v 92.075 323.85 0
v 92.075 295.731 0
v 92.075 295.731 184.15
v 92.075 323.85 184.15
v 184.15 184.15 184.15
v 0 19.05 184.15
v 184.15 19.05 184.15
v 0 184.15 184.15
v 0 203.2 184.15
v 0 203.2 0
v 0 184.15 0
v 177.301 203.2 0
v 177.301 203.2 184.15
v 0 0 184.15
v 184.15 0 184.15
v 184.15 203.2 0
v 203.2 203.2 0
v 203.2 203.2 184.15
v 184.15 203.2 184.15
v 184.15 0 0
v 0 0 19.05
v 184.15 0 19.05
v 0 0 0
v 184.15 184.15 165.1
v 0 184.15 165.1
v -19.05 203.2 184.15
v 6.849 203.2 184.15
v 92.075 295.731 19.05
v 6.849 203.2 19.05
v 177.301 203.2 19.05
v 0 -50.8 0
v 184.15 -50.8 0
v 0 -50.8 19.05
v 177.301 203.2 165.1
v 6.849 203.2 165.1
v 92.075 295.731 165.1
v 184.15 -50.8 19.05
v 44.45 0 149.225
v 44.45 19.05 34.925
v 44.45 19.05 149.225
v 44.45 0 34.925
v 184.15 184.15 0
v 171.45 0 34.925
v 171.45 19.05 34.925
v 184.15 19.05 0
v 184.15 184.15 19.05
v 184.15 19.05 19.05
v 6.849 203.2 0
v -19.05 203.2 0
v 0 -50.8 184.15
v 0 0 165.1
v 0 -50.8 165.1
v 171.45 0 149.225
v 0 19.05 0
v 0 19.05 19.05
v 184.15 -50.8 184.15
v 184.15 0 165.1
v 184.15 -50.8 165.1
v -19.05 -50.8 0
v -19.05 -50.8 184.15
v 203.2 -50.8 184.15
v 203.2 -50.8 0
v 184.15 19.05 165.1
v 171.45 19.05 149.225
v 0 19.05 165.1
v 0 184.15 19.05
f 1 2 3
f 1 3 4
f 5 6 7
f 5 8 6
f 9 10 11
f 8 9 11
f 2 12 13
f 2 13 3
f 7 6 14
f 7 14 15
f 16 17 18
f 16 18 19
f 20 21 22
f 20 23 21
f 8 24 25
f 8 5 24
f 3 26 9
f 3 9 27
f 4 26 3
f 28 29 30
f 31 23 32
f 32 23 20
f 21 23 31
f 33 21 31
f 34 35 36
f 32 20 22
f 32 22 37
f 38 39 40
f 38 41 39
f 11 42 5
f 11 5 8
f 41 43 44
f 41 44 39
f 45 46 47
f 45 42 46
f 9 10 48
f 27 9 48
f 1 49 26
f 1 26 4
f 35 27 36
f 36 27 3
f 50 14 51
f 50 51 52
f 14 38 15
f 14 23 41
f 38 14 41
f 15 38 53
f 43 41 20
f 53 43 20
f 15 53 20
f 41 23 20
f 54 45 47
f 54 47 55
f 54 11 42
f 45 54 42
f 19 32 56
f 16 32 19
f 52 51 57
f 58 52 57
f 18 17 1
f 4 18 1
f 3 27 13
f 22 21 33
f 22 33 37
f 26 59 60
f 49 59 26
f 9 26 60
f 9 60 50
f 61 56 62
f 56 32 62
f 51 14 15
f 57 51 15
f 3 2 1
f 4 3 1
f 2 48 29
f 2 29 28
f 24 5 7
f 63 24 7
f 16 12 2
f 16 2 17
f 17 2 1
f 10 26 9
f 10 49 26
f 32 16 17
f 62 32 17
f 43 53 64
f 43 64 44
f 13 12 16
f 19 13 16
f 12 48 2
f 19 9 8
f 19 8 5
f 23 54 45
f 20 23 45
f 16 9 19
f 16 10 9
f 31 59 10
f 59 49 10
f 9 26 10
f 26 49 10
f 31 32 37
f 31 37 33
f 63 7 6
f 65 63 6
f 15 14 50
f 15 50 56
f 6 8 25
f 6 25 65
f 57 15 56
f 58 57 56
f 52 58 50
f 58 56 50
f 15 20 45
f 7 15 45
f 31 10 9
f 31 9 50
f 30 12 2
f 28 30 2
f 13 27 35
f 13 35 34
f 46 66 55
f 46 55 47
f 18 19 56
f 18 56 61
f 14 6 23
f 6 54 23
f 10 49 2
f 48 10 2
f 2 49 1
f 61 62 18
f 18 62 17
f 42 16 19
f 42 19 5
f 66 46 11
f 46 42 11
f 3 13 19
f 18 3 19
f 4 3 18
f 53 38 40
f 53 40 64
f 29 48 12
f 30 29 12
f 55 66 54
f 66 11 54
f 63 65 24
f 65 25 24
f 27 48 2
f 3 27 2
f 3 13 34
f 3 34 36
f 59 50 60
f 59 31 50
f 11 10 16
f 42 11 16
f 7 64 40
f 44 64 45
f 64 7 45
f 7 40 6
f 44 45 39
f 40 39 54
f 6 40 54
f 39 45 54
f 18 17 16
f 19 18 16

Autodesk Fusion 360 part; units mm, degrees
sketch "Sketch5" plane through (0, 0, 0) normal (0, 0, 1) x (1, 0, 0)
  line L0 (0, 0) -> (184.15, 0)
  line L1 (184.15, 0) -> (184.15, 19.05)
  line L2 (184.15, 19.05) -> (0, 19.05)
  line L3 (0, 19.05) -> (0, 0)
  line L4 (-46.6311, 0) -> (230.0028, 0) construction
  line L5 (0, -50.8) -> (-19.05, -50.8)
  line L6 (-19.05, -50.8) -> (-19.05, 203.2)
  line L7 (-19.05, 203.2) -> (0, 203.2)
  line L8 (0, 203.2) -> (0, -50.8)
  line L9 (184.15, -50.8) -> (203.2, -50.8)
  line L10 (203.2, -50.8) -> (203.2, 203.2)
  line L11 (203.2, 203.2) -> (184.15, 203.2)
  line L12 (184.15, 203.2) -> (184.15, -50.8)
  line L13 (0, 203.2) -> (184.15, 203.2)
  line L14 (184.15, 203.2) -> (184.15, 184.15)
  line L15 (184.15, 184.15) -> (0, 184.15)
  line L16 (0, 184.15) -> (0, 203.2)
  line L17 (0, 0) -> (184.15, 0)
  line L18 (184.15, 0) -> (184.15, -50.8)
  line L19 (184.15, -50.8) -> (0, -50.8)
  line L20 (0, -50.8) -> (0, 0)
  line L21 (92.075, -50.8) -> (92.075, 323.85) construction
  line L22 (-19.05, 203.2) -> (92.075, 323.85)
  line L23 (203.2, 203.2) -> (92.075, 323.85)
  line L24 (189.1879, 190.2941) -> (92.075, 295.7309)
  line L25 (-5.0379, 190.2941) -> (92.075, 295.7309)
  line L26 (92.075, 295.7309) -> (92.075, 323.85)
  dimension "d72" = 184.15
  dimension "d73" = 19.05
  dimension "d74" = 19.05
  dimension "d75" = 254
  dimension "d76" = 19.05
  dimension "d77" = 50.8
  dimension "d78" = 19.05
  dimension "d79" = 254
  dimension "d80" = 50.8
  dimension "d81" = 184.15
  dimension "d82" = 19.05
  dimension "d83" = 374.65
  dimension "d84" = -19.05
extrude "Extrude1" add sketch "Sketch5" along normal blind 184.15 contours L3 L5 L6 L7 L8 L16 L20 | L1 L9 L10 L11 L12 L14 L18 makes body 1 at (0, 118.5333, 61.3833) makes body 2 at (184.15, 33.8667, 122.7667)
extrude "Extrude3" add sketch "Sketch5" along normal blind 184.15 separate body contours L0 L1 L2 L3 L8 L12 L17 | L8 L12 L13 L14 L15 L16 L24 L25 | L8 L13 L16 L25 | L12 L13 L14 L24 makes body 3 at (122.7667, 184.15, 61.3833) makes body 4 at (122.7667, 19.05, 61.3833)
extrude "Extrude5" add sketch "Sketch5" along normal blind 19.05 separate body contours L2 L8 L12 L15 makes body 5
extrude "Extrude6" add sketch "Sketch5" against normal blind 19.05 from surface at 184.15 separate body contours L2 L8 L12 L15 makes body 6
extrude "Extrude7" add sketch "Sketch5" along normal blind 184.15 separate body contours L7 L13 L22 L25 L26 makes body 7
extrude "Extrude19" add sketch "Sketch5" along normal blind 184.15 separate body contours L11 L13 L23 L24 L26 makes body 8
extrude "Extrude17" add sketch "Sketch5" along normal blind 19.05 separate body contours L0 L8 L12 L17 L18 L19 L20 makes body 9
extrude "Extrude18" add sketch "Sketch5" against normal blind 19.05 from surface at 184.15 separate body contours L0 L8 L12 L17 L18 L19 L20 makes body 10
extrude "Extrude13" add sketch "Sketch5" along normal blind 19.05 separate body contours L13 L24 L25 makes body 11
extrude "Extrude14" add sketch "Sketch5" against normal blind 19.05 from surface at 184.15 separate body contours L13 L24 L25 makes body 12
sketch "Sketch3" plane through (0, 0, 0) normal (0, -1, 0) x (1, 0, 0)
  line L0 (0, 203.2) -> (0, 0)
  line L1 (44.45, 149.225) -> (171.45, 149.225)
  line L2 (171.45, 149.225) -> (171.45, 34.925)
  line L3 (171.45, 34.925) -> (44.45, 34.925)
  line L4 (44.45, 34.925) -> (44.45, 149.225)
  line L5 (0, 0) -> (184.15, 0)
  line L6 (184.15, 0) -> (184.15, 184.15)
  line L7 (184.15, 184.15) -> (0, 184.15)
  line L8 (0, 184.15) -> (0, 0)
  line L9 (184.15, 0) -> (0, 0)
  line L10 (0, 0) -> (0, 184.15)
  line L11 (0, 184.15) -> (184.15, 184.15)
  line L12 (184.15, 184.15) -> (184.15, 0)
  dimension "d47" = 127
  dimension "d48" = 114.3
  dimension "d89" = 12.7
  dimension "d90" = 34.925
extrude "Extrude20" cut sketch "Sketch3" against normal up to surface (19.05 mm away) contours L1 L2 L3 L4 bodies 4
ref_plane "WorkPlane2" through (-19.05, 76.2, 92.075) normal (-1, 0, 0) x (0, -1, 0)
sketch "Sketch4" plane through (-19.05, 76.2, 101.6) normal (-1, 0, 0) x (0, 0, -1)
  line L0 (-92.075, 76.2) -> (115.9309, 76.2) construction
  line L1 (111.125, 57.15) -> (-92.075, 57.15) construction
  line L2 (9.525, -127) -> (9.525, 57.15)
  line L3 (111.125, -34.925) -> (-92.075, -34.925)
  line L4 (31.75, -54.61) -> (-12.7, -54.61)
  line L5 (-12.7, -54.61) -> (-12.7, -15.24)
  line L6 (-12.7, -15.24) -> (31.75, -15.24)
  line L7 (31.75, -15.24) -> (31.75, -54.61)
  line L8 (101.6, -127) -> (101.6, 127)
  line L9 (101.6, 127) -> (-101.6, 127)
  line L10 (101.6, -127) -> (101.6, 127)
  line L11 (101.6, 127) -> (-82.55, 127)
  line L12 (-82.55, 127) -> (-82.55, -127)
  line L13 (-82.55, -127) -> (101.6, -127)
  dimension "d54" = 19.05
  dimension "d56" = 44.45
  dimension "d57" = 39.37
  dimension "d58" = 19.685
  dimension "d59" = 22.225
  dimension "d87" = 92.075
  dimension "d88" = 92.075
extrude "Extrude16" [suppressed]
